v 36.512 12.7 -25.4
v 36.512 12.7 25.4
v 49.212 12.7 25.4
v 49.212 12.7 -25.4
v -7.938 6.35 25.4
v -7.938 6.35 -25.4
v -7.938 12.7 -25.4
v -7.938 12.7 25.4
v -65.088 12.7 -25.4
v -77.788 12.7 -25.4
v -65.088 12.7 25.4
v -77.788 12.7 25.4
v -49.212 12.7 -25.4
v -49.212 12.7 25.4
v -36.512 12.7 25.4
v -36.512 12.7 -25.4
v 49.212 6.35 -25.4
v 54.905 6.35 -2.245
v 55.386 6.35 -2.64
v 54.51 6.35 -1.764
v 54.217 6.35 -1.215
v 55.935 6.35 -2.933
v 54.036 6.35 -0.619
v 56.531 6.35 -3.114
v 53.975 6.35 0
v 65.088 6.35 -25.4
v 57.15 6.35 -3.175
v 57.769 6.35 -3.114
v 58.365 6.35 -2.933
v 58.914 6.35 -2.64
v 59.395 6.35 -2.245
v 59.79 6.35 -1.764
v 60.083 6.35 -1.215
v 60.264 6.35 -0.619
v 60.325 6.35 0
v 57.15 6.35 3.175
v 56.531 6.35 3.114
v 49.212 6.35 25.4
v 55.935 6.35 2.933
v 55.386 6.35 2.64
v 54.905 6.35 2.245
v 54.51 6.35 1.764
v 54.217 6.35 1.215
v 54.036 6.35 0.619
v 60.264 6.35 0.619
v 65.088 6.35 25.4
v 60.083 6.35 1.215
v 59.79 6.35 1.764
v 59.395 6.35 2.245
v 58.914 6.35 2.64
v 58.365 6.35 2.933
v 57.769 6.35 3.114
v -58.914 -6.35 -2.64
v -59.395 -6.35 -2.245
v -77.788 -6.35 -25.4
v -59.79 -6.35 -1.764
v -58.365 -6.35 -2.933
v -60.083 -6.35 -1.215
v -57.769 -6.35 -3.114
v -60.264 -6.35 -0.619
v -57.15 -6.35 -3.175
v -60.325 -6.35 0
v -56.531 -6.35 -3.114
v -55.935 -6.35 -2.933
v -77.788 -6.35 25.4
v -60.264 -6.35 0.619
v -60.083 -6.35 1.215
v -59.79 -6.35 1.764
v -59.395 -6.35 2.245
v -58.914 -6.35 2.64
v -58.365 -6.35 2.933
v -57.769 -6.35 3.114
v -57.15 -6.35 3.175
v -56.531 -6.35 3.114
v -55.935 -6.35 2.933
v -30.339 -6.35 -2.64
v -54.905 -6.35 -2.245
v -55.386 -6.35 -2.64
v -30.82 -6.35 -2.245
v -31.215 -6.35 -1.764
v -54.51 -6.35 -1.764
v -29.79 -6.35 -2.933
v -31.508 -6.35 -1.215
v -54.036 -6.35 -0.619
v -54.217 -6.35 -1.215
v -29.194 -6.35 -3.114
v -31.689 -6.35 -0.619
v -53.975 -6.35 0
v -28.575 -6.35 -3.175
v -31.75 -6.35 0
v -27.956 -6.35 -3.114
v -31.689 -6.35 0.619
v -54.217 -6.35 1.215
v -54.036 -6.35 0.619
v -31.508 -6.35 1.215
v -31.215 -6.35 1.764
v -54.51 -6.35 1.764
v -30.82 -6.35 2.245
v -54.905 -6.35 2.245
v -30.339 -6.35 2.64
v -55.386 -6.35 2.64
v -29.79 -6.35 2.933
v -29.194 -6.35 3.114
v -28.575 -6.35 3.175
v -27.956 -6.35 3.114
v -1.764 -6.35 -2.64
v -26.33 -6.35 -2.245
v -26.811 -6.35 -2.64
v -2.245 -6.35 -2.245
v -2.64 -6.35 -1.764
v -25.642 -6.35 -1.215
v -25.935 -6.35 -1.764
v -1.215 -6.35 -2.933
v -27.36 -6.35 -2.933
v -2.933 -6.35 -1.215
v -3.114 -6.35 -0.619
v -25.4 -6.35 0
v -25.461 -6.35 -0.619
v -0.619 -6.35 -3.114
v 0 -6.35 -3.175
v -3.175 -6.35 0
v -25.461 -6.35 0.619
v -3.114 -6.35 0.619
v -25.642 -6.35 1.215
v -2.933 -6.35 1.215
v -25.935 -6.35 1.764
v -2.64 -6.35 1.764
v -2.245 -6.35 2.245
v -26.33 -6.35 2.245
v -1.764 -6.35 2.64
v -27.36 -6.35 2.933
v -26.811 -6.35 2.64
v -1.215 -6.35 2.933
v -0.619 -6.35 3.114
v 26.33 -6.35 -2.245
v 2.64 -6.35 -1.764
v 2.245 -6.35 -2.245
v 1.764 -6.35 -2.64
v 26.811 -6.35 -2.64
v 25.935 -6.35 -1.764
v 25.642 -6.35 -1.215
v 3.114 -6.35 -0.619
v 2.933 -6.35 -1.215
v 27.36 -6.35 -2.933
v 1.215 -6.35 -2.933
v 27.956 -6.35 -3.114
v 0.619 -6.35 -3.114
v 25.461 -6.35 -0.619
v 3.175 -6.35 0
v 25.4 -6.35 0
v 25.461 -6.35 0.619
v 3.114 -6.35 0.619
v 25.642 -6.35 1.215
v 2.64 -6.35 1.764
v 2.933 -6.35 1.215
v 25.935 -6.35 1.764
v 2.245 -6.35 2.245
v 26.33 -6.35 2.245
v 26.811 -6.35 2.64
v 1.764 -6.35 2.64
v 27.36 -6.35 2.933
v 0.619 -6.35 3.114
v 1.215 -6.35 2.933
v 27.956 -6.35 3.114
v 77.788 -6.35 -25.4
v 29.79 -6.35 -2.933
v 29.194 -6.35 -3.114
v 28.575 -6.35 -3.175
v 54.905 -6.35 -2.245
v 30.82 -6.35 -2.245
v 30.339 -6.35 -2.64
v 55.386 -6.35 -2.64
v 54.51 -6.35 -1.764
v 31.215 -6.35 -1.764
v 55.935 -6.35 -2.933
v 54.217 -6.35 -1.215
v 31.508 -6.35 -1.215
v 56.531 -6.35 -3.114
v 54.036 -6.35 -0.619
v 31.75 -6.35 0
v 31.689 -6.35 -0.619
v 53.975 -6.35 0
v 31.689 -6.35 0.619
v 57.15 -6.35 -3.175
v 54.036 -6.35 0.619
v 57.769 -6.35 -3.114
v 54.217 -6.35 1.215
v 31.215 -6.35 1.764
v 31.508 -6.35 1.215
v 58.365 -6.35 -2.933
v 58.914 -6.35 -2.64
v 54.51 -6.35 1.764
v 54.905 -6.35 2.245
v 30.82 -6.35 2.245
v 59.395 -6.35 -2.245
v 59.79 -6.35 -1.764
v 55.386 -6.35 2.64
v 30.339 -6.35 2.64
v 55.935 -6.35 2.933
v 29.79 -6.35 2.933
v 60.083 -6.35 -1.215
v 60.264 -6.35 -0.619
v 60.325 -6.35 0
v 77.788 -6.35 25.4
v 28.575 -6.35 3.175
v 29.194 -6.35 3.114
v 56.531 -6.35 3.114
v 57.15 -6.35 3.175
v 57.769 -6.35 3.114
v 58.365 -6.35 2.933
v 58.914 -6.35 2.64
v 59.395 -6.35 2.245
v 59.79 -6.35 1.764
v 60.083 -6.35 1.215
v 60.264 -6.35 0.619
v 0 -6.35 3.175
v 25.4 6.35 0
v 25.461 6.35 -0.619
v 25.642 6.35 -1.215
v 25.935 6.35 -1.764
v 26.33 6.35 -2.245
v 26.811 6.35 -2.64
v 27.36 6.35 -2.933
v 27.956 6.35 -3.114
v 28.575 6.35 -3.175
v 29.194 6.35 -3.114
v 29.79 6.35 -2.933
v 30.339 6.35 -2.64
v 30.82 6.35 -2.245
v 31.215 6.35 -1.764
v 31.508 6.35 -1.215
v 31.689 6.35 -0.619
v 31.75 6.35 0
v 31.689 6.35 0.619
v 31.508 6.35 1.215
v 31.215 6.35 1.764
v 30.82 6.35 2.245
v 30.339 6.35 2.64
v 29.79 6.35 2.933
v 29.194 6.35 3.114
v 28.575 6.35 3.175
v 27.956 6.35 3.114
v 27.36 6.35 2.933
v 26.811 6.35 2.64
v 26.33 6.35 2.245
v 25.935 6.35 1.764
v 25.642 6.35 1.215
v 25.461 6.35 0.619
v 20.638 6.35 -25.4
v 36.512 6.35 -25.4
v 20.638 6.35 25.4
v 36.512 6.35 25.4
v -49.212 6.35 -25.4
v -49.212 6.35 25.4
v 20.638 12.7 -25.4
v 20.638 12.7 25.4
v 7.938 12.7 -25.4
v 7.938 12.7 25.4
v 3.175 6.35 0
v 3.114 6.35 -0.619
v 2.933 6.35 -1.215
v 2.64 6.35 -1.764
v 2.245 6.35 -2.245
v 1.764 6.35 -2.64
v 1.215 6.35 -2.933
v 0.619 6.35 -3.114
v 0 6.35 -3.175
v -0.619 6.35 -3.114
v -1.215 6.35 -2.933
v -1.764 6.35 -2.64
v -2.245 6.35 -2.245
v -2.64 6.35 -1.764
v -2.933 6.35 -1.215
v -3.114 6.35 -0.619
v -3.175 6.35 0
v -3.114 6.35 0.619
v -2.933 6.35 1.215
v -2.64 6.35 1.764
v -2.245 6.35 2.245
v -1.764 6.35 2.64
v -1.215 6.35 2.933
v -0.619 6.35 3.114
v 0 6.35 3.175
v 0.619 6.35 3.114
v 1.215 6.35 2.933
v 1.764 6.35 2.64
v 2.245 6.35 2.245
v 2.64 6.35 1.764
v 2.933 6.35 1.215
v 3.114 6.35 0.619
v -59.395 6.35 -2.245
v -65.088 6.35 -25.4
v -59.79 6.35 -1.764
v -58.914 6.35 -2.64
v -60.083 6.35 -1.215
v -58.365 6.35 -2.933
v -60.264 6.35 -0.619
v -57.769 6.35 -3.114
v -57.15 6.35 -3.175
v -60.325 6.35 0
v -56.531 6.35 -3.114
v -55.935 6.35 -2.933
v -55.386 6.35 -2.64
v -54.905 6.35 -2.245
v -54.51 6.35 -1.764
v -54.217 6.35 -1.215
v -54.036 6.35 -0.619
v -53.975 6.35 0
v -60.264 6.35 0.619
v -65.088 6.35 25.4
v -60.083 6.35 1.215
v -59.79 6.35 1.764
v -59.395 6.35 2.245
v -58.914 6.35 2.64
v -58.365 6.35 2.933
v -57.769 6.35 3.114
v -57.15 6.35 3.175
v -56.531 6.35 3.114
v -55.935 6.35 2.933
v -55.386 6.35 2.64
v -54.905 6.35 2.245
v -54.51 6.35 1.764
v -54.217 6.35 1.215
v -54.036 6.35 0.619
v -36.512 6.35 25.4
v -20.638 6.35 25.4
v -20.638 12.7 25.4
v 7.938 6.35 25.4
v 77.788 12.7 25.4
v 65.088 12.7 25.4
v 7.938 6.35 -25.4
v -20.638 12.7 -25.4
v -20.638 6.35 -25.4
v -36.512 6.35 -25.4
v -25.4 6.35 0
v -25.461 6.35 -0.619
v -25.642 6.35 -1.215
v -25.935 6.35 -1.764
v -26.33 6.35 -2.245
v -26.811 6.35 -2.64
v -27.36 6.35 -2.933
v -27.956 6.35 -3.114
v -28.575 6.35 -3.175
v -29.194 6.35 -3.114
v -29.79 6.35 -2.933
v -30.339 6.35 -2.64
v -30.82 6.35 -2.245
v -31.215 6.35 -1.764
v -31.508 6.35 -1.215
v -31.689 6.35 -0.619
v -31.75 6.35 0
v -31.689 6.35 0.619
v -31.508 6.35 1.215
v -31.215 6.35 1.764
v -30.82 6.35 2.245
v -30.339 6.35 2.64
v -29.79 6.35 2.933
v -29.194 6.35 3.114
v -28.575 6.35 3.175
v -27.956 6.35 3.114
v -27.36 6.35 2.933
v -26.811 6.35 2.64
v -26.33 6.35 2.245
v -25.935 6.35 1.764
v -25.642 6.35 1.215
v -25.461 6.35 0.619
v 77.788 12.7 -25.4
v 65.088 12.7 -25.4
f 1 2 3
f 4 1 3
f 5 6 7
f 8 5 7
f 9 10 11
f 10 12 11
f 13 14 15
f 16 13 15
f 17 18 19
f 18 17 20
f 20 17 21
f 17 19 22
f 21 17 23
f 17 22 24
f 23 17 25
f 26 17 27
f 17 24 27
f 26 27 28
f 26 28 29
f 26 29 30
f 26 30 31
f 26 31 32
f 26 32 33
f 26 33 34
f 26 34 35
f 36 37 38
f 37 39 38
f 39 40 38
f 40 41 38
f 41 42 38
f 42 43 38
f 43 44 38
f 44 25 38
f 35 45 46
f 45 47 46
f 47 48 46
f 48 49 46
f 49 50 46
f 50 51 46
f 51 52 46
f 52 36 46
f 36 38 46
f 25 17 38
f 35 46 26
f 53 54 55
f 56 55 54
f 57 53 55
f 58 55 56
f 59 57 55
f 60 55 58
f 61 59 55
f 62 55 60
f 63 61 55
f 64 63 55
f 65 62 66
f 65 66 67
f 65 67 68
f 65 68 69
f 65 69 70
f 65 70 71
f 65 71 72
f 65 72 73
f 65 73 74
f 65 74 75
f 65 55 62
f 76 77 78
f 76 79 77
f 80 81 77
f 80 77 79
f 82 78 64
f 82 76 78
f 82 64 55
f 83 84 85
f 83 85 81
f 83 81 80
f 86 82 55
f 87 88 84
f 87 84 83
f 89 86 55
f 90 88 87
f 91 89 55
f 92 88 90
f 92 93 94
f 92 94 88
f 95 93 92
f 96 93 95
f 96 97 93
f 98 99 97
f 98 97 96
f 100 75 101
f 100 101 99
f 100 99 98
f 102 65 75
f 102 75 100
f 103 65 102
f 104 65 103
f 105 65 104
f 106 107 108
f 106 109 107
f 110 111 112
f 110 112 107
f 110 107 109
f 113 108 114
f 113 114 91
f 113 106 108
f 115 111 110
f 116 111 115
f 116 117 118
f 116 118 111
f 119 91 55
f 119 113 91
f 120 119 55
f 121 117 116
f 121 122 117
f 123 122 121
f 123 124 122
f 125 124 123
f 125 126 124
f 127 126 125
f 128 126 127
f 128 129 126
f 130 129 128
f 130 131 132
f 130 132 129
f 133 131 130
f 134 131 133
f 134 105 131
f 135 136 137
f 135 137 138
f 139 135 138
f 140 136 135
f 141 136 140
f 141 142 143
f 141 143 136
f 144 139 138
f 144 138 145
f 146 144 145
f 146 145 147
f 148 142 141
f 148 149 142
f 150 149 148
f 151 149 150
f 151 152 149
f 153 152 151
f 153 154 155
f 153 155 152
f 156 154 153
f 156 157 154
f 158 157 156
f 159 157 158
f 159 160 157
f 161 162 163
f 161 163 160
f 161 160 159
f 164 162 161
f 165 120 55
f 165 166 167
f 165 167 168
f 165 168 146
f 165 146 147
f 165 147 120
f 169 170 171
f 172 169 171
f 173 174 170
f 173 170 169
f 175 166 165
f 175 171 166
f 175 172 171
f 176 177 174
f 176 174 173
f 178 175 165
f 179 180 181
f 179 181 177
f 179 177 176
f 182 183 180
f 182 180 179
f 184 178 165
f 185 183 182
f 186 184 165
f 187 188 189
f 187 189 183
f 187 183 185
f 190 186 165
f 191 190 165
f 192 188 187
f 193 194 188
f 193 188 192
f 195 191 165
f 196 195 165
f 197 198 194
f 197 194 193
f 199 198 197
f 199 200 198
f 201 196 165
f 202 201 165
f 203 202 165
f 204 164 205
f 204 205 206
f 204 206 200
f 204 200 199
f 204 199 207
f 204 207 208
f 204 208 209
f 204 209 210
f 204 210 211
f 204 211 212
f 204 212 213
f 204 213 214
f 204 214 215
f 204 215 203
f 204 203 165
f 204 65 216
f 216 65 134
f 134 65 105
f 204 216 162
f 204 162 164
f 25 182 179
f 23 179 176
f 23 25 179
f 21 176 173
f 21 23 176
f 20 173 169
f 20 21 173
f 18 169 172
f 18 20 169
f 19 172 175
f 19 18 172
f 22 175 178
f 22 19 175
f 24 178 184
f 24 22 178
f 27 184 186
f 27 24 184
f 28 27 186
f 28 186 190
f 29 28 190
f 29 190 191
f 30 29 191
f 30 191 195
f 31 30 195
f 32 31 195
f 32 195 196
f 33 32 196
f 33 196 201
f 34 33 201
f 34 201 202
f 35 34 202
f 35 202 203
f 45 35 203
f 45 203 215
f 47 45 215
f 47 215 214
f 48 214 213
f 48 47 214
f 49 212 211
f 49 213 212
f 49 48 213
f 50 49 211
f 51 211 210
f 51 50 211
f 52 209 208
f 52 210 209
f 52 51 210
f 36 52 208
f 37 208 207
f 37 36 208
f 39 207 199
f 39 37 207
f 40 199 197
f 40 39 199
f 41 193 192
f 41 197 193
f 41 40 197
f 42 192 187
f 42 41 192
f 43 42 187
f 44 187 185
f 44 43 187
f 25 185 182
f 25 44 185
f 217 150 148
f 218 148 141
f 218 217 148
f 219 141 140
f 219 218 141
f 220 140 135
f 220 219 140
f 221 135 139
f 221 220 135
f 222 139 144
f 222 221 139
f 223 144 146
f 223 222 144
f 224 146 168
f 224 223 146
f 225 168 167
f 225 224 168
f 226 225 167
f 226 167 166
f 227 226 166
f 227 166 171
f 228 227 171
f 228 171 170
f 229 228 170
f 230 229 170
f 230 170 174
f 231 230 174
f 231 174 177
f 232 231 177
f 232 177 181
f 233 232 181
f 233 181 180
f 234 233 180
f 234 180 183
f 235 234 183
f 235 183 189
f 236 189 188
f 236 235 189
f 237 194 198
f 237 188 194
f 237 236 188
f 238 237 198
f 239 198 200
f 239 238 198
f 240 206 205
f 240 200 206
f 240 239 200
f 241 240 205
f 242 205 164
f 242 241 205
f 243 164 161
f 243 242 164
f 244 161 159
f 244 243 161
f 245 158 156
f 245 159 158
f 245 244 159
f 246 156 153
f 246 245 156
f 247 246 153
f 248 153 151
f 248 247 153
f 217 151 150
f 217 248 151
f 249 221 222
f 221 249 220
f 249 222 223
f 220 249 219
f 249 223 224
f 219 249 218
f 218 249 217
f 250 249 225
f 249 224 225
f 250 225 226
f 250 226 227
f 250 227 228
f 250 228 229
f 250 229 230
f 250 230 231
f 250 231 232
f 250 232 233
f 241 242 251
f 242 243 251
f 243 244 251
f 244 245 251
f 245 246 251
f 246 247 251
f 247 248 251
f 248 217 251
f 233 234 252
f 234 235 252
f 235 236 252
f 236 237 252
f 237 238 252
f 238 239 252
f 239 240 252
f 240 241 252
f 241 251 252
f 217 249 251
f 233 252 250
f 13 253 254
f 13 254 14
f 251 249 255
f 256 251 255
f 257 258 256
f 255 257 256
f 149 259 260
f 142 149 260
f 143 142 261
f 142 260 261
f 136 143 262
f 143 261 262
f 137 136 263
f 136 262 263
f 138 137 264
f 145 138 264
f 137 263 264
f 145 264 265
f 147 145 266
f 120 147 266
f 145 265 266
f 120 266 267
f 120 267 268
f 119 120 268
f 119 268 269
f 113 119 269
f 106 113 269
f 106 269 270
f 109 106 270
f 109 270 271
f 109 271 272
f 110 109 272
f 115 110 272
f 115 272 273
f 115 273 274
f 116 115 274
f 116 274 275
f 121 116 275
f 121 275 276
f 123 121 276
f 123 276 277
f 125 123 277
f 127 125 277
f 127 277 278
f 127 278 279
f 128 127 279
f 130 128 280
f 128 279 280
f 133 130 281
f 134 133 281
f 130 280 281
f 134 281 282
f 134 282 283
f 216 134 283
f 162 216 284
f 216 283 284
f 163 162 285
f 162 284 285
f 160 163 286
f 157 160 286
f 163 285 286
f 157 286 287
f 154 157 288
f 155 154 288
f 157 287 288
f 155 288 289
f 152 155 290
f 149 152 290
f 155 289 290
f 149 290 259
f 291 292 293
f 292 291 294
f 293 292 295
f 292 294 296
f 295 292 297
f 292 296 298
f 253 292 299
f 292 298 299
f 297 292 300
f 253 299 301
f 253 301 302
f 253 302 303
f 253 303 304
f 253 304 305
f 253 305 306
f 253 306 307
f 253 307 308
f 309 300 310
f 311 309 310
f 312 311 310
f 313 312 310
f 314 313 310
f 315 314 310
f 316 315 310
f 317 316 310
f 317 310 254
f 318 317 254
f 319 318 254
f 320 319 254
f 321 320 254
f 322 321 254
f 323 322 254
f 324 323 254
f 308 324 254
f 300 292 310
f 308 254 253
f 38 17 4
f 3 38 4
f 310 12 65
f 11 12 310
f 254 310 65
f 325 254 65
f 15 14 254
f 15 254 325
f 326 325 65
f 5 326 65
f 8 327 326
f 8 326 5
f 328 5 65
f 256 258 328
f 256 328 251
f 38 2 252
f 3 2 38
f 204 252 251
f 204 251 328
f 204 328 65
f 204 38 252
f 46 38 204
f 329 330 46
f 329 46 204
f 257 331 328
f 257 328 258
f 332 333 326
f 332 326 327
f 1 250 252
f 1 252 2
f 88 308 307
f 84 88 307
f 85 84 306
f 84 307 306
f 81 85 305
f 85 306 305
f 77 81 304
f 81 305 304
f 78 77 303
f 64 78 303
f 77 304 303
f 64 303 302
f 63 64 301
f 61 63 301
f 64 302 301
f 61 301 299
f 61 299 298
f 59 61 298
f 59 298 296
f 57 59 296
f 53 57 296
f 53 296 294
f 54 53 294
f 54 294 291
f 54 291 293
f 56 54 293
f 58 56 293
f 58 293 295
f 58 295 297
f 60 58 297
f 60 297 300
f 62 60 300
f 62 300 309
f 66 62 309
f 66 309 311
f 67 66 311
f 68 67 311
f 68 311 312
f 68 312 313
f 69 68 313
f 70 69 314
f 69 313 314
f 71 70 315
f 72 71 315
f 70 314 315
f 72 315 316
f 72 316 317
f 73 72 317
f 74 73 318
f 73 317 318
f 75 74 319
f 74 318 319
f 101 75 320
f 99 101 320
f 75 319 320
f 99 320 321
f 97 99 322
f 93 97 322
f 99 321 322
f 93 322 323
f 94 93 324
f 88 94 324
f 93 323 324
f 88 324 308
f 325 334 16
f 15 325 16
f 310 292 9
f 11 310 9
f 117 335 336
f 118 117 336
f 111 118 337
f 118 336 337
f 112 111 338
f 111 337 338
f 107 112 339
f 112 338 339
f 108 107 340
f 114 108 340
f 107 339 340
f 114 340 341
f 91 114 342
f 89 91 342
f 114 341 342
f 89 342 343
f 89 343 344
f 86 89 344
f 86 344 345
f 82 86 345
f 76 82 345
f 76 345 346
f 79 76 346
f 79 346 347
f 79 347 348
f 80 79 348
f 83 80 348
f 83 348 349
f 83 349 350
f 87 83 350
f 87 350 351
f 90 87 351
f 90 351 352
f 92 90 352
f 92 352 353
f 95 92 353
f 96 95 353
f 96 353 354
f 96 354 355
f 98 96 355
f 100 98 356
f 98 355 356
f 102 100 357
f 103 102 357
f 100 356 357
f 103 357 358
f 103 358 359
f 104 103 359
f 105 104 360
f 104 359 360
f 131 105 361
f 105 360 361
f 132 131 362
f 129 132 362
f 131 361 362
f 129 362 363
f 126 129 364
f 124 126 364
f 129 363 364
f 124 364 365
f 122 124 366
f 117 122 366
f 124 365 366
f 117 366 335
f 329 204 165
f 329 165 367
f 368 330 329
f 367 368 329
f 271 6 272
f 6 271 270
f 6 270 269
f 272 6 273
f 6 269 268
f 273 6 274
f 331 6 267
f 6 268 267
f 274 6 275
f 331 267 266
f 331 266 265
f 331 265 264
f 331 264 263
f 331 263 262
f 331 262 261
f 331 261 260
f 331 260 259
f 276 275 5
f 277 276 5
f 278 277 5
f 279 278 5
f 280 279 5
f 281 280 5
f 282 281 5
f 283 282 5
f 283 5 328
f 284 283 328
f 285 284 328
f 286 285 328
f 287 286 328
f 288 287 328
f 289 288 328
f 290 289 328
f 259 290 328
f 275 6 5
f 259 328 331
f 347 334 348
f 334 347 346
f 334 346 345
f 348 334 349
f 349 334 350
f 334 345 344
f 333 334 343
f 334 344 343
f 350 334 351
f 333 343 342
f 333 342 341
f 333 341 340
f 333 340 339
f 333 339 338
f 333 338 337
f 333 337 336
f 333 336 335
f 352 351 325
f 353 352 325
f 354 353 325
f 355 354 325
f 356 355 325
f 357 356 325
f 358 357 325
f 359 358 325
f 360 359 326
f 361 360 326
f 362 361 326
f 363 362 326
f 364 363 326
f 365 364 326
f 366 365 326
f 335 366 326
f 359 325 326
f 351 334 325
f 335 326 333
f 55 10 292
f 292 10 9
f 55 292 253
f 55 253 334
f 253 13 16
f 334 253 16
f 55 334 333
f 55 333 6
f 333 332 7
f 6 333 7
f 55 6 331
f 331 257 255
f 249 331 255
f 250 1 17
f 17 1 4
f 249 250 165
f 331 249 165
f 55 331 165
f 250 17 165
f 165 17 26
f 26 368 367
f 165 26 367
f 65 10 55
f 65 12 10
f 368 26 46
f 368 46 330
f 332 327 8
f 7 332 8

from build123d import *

# Parameters (mm, degrees)
SKETCH1_W           = 155.575
SKETCH1_H           = 12.7
SKETCH1_W_2         = 12.7
SKETCH1_H_2         = 6.35
BOSS_EXTRUDE1_DEPTH = 25.4
SKETCH2_R           = 3.175
CUT_EXTRUDE1_DEPTH  = 13.7


with BuildPart() as part:
    # Sketch1 → Boss-Extrude1 (new body, symmetric)
    with BuildSketch(Plane.XY):
        Rectangle(SKETCH1_W, SKETCH1_H)
        with Locations((71.4375, 9.525)):
            Rectangle(SKETCH1_W_2, SKETCH1_H_2)
        with Locations((42.8625, 9.525)):
            Rectangle(SKETCH1_W_2, SKETCH1_H_2)
        with Locations((14.2875, 9.525)):
            Rectangle(SKETCH1_W_2, SKETCH1_H_2)
        with Locations((-14.2875, 9.525)):
            Rectangle(SKETCH1_W_2, SKETCH1_H_2)
        with Locations((-71.4375, 9.525)):
            Rectangle(SKETCH1_W_2, SKETCH1_H_2)
        with Locations((-42.8625, 9.525)):
            Rectangle(SKETCH1_W_2, SKETCH1_H_2)
    extrude(amount=BOSS_EXTRUDE1_DEPTH, both=True)

    # Sketch2 → Cut-Extrude1 (cut, through all)
    with BuildSketch(Plane(origin=(0, 6.35, 0), x_dir=(1, 0, 0), z_dir=(0, 1, 0))):
        Circle(SKETCH2_R)
        with Locations((-28.575, 0)):
            Circle(SKETCH2_R)
        with Locations((-57.15, 0)):
            Circle(SKETCH2_R)
    cut_extrude1 = extrude(amount=-CUT_EXTRUDE1_DEPTH, mode=Mode.SUBTRACT)

    # Mirror1: Cut-Extrude1 across plane
    add(cut_extrude1.mirror(Plane(origin=(0, 0, 0), x_dir=(0, 0, 1), z_dir=(1, 0, 0))), mode=Mode.SUBTRACT)


solid = part.part
